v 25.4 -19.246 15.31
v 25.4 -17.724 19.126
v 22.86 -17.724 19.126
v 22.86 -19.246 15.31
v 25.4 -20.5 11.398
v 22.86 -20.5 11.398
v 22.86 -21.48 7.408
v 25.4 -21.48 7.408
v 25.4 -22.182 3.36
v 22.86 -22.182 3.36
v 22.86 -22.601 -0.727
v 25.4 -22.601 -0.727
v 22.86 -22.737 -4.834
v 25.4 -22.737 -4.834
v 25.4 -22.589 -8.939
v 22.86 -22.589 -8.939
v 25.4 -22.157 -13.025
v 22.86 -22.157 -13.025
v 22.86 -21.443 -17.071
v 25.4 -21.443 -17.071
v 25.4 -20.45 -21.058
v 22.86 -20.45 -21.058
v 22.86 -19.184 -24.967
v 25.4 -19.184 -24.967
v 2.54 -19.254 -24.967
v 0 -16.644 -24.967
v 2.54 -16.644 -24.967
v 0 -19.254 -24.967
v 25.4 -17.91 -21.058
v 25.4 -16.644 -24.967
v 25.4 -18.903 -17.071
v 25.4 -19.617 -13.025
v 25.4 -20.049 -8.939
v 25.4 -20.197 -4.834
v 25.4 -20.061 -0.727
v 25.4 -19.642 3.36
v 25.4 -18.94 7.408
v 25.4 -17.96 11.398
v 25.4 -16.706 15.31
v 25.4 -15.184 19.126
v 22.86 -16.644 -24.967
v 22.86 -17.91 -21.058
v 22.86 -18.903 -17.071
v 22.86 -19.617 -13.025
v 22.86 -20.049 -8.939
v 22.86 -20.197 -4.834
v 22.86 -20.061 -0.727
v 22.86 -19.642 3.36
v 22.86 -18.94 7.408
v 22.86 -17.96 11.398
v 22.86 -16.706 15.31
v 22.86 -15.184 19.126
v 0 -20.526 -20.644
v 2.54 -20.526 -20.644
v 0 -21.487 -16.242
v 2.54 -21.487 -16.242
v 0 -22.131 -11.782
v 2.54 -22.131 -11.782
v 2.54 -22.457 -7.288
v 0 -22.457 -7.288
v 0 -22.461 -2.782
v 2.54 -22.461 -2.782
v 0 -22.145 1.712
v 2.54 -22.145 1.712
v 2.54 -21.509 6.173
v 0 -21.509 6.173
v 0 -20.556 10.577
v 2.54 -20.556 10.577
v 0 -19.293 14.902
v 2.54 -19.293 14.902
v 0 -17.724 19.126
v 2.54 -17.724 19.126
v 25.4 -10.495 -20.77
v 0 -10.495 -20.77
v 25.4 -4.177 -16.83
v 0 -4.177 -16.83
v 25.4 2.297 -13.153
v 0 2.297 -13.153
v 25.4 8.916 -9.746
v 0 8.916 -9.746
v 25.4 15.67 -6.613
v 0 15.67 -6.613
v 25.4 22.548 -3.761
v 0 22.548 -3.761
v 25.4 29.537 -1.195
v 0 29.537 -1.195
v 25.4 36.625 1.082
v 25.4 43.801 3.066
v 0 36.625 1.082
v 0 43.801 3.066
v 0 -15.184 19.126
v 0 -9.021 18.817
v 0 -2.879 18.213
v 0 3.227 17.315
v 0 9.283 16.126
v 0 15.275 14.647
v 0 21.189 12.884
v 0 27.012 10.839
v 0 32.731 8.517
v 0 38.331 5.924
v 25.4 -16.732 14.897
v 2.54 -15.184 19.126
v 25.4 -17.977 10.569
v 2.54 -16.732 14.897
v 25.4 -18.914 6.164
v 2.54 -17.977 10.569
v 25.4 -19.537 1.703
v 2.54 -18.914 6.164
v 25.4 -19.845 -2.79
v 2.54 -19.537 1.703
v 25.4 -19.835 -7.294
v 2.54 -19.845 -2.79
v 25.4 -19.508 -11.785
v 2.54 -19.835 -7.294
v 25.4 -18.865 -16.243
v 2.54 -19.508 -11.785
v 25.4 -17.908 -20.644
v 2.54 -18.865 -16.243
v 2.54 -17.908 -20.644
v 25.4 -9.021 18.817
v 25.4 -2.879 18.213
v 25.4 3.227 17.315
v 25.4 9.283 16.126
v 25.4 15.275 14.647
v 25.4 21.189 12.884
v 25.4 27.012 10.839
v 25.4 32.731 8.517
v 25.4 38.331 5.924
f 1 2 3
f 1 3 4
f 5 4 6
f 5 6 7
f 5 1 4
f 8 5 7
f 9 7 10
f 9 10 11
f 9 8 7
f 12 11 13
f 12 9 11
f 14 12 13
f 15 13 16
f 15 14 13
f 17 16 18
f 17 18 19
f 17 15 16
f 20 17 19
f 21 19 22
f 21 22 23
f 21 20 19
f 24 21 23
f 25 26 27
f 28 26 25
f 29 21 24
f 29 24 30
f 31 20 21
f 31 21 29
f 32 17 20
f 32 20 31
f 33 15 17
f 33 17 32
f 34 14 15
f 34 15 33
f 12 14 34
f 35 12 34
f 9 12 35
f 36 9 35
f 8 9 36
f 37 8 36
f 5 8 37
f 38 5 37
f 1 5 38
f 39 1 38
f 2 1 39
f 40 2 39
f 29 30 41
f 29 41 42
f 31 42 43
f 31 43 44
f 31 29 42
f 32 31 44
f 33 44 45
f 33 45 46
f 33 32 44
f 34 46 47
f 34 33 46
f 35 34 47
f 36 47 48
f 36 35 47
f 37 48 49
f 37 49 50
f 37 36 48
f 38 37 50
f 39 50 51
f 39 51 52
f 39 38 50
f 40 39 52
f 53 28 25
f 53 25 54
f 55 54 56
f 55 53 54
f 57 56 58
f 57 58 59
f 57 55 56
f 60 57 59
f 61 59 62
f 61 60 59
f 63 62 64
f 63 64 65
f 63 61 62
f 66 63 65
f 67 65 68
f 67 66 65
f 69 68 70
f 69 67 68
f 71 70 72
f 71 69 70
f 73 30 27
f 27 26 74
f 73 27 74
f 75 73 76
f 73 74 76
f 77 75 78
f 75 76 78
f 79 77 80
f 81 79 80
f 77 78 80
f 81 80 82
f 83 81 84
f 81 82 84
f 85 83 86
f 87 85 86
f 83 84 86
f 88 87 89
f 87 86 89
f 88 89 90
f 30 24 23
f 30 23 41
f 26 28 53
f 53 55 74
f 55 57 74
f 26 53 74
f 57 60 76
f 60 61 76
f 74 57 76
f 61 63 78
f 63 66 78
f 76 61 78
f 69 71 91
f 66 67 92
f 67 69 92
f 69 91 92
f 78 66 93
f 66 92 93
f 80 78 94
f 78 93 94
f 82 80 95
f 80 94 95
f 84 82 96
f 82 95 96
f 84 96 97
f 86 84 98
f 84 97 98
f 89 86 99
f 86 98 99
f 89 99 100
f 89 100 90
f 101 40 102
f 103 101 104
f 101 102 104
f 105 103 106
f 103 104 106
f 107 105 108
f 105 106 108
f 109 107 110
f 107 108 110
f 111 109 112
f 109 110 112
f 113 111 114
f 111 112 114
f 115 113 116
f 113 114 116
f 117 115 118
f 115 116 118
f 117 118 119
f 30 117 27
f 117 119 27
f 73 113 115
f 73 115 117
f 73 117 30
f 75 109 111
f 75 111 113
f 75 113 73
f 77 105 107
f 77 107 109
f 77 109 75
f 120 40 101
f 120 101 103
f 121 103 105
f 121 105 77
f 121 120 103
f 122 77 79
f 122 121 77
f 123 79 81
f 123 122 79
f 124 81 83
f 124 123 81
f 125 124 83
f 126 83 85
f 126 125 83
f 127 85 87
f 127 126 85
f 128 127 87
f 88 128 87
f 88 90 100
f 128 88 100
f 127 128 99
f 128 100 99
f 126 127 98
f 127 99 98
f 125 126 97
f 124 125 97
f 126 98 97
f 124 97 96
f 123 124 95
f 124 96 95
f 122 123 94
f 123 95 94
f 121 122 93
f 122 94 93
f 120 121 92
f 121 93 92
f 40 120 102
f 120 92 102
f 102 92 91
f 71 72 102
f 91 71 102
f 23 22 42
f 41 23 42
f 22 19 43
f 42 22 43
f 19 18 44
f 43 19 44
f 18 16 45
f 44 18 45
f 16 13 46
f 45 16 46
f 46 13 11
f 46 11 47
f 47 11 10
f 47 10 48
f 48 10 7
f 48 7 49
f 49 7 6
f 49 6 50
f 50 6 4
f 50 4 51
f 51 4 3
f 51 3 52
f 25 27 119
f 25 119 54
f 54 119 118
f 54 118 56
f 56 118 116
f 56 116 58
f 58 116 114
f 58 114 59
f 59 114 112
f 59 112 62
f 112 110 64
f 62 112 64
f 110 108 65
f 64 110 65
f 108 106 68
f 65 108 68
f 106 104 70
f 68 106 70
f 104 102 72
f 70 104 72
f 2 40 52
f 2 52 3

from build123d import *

# Parameters (mm, degrees)
F1_DEPTH = 25.4
F3_DEPTH = 2.54
F5_DEPTH = 2.54


with BuildPart() as f1:
    # F0 (on Right) → F1 (new body)
    with BuildSketch(Plane.YZ):
        with BuildLine():
            ThreePointArc((-16.644416, -24.966624), (12.277165, -8.144617), (43.801095, 3.066077))
            ThreePointArc((43.801095, 3.066077), (15.275229, 14.647333), (-15.184379, 19.126479))
            ThreePointArc((-15.184379, 19.126479), (-19.845197, -2.789914), (-16.644416, -24.966624))
        make_face()
    extrude(amount=F1_DEPTH)

    # F4 (on face) → F5 (join)
    with BuildSketch(Plane(origin=(0, 0, 0), x_dir=(0, -1, 0), z_dir=(-1, 0, 0))):
        with BuildLine():
            ThreePointArc((15.184379, 19.126479), (19.826138, -2.790545), (16.644416, -24.966624))
            Line((16.644416, -24.966624), (19.253846, -24.966624))
            ThreePointArc((19.253846, -24.966624), (22.461144, -2.782294), (17.724379, 19.126479))
            Line((17.724379, 19.126479), (15.184379, 19.126479))
        make_face()
    extrude(amount=-F5_DEPTH)


with BuildPart() as f3:
    # F2 (on face) → F3 (new body)
    with BuildSketch(Plane.YZ.offset(25.4)):
        with BuildLine():
            ThreePointArc((-16.644416, -24.966624), (-20.165023, -2.779323), (-15.184379, 19.126479))
            Line((-15.184379, 19.126479), (-17.724379, 19.126479))
            ThreePointArc((-17.724379, 19.126479), (-22.705023, -2.779323), (-19.184416, -24.966624))
            Line((-19.184416, -24.966624), (-16.644416, -24.966624))
        make_face()
    extrude(amount=-F3_DEPTH)


solid = Compound([f1.part, f3.part])
